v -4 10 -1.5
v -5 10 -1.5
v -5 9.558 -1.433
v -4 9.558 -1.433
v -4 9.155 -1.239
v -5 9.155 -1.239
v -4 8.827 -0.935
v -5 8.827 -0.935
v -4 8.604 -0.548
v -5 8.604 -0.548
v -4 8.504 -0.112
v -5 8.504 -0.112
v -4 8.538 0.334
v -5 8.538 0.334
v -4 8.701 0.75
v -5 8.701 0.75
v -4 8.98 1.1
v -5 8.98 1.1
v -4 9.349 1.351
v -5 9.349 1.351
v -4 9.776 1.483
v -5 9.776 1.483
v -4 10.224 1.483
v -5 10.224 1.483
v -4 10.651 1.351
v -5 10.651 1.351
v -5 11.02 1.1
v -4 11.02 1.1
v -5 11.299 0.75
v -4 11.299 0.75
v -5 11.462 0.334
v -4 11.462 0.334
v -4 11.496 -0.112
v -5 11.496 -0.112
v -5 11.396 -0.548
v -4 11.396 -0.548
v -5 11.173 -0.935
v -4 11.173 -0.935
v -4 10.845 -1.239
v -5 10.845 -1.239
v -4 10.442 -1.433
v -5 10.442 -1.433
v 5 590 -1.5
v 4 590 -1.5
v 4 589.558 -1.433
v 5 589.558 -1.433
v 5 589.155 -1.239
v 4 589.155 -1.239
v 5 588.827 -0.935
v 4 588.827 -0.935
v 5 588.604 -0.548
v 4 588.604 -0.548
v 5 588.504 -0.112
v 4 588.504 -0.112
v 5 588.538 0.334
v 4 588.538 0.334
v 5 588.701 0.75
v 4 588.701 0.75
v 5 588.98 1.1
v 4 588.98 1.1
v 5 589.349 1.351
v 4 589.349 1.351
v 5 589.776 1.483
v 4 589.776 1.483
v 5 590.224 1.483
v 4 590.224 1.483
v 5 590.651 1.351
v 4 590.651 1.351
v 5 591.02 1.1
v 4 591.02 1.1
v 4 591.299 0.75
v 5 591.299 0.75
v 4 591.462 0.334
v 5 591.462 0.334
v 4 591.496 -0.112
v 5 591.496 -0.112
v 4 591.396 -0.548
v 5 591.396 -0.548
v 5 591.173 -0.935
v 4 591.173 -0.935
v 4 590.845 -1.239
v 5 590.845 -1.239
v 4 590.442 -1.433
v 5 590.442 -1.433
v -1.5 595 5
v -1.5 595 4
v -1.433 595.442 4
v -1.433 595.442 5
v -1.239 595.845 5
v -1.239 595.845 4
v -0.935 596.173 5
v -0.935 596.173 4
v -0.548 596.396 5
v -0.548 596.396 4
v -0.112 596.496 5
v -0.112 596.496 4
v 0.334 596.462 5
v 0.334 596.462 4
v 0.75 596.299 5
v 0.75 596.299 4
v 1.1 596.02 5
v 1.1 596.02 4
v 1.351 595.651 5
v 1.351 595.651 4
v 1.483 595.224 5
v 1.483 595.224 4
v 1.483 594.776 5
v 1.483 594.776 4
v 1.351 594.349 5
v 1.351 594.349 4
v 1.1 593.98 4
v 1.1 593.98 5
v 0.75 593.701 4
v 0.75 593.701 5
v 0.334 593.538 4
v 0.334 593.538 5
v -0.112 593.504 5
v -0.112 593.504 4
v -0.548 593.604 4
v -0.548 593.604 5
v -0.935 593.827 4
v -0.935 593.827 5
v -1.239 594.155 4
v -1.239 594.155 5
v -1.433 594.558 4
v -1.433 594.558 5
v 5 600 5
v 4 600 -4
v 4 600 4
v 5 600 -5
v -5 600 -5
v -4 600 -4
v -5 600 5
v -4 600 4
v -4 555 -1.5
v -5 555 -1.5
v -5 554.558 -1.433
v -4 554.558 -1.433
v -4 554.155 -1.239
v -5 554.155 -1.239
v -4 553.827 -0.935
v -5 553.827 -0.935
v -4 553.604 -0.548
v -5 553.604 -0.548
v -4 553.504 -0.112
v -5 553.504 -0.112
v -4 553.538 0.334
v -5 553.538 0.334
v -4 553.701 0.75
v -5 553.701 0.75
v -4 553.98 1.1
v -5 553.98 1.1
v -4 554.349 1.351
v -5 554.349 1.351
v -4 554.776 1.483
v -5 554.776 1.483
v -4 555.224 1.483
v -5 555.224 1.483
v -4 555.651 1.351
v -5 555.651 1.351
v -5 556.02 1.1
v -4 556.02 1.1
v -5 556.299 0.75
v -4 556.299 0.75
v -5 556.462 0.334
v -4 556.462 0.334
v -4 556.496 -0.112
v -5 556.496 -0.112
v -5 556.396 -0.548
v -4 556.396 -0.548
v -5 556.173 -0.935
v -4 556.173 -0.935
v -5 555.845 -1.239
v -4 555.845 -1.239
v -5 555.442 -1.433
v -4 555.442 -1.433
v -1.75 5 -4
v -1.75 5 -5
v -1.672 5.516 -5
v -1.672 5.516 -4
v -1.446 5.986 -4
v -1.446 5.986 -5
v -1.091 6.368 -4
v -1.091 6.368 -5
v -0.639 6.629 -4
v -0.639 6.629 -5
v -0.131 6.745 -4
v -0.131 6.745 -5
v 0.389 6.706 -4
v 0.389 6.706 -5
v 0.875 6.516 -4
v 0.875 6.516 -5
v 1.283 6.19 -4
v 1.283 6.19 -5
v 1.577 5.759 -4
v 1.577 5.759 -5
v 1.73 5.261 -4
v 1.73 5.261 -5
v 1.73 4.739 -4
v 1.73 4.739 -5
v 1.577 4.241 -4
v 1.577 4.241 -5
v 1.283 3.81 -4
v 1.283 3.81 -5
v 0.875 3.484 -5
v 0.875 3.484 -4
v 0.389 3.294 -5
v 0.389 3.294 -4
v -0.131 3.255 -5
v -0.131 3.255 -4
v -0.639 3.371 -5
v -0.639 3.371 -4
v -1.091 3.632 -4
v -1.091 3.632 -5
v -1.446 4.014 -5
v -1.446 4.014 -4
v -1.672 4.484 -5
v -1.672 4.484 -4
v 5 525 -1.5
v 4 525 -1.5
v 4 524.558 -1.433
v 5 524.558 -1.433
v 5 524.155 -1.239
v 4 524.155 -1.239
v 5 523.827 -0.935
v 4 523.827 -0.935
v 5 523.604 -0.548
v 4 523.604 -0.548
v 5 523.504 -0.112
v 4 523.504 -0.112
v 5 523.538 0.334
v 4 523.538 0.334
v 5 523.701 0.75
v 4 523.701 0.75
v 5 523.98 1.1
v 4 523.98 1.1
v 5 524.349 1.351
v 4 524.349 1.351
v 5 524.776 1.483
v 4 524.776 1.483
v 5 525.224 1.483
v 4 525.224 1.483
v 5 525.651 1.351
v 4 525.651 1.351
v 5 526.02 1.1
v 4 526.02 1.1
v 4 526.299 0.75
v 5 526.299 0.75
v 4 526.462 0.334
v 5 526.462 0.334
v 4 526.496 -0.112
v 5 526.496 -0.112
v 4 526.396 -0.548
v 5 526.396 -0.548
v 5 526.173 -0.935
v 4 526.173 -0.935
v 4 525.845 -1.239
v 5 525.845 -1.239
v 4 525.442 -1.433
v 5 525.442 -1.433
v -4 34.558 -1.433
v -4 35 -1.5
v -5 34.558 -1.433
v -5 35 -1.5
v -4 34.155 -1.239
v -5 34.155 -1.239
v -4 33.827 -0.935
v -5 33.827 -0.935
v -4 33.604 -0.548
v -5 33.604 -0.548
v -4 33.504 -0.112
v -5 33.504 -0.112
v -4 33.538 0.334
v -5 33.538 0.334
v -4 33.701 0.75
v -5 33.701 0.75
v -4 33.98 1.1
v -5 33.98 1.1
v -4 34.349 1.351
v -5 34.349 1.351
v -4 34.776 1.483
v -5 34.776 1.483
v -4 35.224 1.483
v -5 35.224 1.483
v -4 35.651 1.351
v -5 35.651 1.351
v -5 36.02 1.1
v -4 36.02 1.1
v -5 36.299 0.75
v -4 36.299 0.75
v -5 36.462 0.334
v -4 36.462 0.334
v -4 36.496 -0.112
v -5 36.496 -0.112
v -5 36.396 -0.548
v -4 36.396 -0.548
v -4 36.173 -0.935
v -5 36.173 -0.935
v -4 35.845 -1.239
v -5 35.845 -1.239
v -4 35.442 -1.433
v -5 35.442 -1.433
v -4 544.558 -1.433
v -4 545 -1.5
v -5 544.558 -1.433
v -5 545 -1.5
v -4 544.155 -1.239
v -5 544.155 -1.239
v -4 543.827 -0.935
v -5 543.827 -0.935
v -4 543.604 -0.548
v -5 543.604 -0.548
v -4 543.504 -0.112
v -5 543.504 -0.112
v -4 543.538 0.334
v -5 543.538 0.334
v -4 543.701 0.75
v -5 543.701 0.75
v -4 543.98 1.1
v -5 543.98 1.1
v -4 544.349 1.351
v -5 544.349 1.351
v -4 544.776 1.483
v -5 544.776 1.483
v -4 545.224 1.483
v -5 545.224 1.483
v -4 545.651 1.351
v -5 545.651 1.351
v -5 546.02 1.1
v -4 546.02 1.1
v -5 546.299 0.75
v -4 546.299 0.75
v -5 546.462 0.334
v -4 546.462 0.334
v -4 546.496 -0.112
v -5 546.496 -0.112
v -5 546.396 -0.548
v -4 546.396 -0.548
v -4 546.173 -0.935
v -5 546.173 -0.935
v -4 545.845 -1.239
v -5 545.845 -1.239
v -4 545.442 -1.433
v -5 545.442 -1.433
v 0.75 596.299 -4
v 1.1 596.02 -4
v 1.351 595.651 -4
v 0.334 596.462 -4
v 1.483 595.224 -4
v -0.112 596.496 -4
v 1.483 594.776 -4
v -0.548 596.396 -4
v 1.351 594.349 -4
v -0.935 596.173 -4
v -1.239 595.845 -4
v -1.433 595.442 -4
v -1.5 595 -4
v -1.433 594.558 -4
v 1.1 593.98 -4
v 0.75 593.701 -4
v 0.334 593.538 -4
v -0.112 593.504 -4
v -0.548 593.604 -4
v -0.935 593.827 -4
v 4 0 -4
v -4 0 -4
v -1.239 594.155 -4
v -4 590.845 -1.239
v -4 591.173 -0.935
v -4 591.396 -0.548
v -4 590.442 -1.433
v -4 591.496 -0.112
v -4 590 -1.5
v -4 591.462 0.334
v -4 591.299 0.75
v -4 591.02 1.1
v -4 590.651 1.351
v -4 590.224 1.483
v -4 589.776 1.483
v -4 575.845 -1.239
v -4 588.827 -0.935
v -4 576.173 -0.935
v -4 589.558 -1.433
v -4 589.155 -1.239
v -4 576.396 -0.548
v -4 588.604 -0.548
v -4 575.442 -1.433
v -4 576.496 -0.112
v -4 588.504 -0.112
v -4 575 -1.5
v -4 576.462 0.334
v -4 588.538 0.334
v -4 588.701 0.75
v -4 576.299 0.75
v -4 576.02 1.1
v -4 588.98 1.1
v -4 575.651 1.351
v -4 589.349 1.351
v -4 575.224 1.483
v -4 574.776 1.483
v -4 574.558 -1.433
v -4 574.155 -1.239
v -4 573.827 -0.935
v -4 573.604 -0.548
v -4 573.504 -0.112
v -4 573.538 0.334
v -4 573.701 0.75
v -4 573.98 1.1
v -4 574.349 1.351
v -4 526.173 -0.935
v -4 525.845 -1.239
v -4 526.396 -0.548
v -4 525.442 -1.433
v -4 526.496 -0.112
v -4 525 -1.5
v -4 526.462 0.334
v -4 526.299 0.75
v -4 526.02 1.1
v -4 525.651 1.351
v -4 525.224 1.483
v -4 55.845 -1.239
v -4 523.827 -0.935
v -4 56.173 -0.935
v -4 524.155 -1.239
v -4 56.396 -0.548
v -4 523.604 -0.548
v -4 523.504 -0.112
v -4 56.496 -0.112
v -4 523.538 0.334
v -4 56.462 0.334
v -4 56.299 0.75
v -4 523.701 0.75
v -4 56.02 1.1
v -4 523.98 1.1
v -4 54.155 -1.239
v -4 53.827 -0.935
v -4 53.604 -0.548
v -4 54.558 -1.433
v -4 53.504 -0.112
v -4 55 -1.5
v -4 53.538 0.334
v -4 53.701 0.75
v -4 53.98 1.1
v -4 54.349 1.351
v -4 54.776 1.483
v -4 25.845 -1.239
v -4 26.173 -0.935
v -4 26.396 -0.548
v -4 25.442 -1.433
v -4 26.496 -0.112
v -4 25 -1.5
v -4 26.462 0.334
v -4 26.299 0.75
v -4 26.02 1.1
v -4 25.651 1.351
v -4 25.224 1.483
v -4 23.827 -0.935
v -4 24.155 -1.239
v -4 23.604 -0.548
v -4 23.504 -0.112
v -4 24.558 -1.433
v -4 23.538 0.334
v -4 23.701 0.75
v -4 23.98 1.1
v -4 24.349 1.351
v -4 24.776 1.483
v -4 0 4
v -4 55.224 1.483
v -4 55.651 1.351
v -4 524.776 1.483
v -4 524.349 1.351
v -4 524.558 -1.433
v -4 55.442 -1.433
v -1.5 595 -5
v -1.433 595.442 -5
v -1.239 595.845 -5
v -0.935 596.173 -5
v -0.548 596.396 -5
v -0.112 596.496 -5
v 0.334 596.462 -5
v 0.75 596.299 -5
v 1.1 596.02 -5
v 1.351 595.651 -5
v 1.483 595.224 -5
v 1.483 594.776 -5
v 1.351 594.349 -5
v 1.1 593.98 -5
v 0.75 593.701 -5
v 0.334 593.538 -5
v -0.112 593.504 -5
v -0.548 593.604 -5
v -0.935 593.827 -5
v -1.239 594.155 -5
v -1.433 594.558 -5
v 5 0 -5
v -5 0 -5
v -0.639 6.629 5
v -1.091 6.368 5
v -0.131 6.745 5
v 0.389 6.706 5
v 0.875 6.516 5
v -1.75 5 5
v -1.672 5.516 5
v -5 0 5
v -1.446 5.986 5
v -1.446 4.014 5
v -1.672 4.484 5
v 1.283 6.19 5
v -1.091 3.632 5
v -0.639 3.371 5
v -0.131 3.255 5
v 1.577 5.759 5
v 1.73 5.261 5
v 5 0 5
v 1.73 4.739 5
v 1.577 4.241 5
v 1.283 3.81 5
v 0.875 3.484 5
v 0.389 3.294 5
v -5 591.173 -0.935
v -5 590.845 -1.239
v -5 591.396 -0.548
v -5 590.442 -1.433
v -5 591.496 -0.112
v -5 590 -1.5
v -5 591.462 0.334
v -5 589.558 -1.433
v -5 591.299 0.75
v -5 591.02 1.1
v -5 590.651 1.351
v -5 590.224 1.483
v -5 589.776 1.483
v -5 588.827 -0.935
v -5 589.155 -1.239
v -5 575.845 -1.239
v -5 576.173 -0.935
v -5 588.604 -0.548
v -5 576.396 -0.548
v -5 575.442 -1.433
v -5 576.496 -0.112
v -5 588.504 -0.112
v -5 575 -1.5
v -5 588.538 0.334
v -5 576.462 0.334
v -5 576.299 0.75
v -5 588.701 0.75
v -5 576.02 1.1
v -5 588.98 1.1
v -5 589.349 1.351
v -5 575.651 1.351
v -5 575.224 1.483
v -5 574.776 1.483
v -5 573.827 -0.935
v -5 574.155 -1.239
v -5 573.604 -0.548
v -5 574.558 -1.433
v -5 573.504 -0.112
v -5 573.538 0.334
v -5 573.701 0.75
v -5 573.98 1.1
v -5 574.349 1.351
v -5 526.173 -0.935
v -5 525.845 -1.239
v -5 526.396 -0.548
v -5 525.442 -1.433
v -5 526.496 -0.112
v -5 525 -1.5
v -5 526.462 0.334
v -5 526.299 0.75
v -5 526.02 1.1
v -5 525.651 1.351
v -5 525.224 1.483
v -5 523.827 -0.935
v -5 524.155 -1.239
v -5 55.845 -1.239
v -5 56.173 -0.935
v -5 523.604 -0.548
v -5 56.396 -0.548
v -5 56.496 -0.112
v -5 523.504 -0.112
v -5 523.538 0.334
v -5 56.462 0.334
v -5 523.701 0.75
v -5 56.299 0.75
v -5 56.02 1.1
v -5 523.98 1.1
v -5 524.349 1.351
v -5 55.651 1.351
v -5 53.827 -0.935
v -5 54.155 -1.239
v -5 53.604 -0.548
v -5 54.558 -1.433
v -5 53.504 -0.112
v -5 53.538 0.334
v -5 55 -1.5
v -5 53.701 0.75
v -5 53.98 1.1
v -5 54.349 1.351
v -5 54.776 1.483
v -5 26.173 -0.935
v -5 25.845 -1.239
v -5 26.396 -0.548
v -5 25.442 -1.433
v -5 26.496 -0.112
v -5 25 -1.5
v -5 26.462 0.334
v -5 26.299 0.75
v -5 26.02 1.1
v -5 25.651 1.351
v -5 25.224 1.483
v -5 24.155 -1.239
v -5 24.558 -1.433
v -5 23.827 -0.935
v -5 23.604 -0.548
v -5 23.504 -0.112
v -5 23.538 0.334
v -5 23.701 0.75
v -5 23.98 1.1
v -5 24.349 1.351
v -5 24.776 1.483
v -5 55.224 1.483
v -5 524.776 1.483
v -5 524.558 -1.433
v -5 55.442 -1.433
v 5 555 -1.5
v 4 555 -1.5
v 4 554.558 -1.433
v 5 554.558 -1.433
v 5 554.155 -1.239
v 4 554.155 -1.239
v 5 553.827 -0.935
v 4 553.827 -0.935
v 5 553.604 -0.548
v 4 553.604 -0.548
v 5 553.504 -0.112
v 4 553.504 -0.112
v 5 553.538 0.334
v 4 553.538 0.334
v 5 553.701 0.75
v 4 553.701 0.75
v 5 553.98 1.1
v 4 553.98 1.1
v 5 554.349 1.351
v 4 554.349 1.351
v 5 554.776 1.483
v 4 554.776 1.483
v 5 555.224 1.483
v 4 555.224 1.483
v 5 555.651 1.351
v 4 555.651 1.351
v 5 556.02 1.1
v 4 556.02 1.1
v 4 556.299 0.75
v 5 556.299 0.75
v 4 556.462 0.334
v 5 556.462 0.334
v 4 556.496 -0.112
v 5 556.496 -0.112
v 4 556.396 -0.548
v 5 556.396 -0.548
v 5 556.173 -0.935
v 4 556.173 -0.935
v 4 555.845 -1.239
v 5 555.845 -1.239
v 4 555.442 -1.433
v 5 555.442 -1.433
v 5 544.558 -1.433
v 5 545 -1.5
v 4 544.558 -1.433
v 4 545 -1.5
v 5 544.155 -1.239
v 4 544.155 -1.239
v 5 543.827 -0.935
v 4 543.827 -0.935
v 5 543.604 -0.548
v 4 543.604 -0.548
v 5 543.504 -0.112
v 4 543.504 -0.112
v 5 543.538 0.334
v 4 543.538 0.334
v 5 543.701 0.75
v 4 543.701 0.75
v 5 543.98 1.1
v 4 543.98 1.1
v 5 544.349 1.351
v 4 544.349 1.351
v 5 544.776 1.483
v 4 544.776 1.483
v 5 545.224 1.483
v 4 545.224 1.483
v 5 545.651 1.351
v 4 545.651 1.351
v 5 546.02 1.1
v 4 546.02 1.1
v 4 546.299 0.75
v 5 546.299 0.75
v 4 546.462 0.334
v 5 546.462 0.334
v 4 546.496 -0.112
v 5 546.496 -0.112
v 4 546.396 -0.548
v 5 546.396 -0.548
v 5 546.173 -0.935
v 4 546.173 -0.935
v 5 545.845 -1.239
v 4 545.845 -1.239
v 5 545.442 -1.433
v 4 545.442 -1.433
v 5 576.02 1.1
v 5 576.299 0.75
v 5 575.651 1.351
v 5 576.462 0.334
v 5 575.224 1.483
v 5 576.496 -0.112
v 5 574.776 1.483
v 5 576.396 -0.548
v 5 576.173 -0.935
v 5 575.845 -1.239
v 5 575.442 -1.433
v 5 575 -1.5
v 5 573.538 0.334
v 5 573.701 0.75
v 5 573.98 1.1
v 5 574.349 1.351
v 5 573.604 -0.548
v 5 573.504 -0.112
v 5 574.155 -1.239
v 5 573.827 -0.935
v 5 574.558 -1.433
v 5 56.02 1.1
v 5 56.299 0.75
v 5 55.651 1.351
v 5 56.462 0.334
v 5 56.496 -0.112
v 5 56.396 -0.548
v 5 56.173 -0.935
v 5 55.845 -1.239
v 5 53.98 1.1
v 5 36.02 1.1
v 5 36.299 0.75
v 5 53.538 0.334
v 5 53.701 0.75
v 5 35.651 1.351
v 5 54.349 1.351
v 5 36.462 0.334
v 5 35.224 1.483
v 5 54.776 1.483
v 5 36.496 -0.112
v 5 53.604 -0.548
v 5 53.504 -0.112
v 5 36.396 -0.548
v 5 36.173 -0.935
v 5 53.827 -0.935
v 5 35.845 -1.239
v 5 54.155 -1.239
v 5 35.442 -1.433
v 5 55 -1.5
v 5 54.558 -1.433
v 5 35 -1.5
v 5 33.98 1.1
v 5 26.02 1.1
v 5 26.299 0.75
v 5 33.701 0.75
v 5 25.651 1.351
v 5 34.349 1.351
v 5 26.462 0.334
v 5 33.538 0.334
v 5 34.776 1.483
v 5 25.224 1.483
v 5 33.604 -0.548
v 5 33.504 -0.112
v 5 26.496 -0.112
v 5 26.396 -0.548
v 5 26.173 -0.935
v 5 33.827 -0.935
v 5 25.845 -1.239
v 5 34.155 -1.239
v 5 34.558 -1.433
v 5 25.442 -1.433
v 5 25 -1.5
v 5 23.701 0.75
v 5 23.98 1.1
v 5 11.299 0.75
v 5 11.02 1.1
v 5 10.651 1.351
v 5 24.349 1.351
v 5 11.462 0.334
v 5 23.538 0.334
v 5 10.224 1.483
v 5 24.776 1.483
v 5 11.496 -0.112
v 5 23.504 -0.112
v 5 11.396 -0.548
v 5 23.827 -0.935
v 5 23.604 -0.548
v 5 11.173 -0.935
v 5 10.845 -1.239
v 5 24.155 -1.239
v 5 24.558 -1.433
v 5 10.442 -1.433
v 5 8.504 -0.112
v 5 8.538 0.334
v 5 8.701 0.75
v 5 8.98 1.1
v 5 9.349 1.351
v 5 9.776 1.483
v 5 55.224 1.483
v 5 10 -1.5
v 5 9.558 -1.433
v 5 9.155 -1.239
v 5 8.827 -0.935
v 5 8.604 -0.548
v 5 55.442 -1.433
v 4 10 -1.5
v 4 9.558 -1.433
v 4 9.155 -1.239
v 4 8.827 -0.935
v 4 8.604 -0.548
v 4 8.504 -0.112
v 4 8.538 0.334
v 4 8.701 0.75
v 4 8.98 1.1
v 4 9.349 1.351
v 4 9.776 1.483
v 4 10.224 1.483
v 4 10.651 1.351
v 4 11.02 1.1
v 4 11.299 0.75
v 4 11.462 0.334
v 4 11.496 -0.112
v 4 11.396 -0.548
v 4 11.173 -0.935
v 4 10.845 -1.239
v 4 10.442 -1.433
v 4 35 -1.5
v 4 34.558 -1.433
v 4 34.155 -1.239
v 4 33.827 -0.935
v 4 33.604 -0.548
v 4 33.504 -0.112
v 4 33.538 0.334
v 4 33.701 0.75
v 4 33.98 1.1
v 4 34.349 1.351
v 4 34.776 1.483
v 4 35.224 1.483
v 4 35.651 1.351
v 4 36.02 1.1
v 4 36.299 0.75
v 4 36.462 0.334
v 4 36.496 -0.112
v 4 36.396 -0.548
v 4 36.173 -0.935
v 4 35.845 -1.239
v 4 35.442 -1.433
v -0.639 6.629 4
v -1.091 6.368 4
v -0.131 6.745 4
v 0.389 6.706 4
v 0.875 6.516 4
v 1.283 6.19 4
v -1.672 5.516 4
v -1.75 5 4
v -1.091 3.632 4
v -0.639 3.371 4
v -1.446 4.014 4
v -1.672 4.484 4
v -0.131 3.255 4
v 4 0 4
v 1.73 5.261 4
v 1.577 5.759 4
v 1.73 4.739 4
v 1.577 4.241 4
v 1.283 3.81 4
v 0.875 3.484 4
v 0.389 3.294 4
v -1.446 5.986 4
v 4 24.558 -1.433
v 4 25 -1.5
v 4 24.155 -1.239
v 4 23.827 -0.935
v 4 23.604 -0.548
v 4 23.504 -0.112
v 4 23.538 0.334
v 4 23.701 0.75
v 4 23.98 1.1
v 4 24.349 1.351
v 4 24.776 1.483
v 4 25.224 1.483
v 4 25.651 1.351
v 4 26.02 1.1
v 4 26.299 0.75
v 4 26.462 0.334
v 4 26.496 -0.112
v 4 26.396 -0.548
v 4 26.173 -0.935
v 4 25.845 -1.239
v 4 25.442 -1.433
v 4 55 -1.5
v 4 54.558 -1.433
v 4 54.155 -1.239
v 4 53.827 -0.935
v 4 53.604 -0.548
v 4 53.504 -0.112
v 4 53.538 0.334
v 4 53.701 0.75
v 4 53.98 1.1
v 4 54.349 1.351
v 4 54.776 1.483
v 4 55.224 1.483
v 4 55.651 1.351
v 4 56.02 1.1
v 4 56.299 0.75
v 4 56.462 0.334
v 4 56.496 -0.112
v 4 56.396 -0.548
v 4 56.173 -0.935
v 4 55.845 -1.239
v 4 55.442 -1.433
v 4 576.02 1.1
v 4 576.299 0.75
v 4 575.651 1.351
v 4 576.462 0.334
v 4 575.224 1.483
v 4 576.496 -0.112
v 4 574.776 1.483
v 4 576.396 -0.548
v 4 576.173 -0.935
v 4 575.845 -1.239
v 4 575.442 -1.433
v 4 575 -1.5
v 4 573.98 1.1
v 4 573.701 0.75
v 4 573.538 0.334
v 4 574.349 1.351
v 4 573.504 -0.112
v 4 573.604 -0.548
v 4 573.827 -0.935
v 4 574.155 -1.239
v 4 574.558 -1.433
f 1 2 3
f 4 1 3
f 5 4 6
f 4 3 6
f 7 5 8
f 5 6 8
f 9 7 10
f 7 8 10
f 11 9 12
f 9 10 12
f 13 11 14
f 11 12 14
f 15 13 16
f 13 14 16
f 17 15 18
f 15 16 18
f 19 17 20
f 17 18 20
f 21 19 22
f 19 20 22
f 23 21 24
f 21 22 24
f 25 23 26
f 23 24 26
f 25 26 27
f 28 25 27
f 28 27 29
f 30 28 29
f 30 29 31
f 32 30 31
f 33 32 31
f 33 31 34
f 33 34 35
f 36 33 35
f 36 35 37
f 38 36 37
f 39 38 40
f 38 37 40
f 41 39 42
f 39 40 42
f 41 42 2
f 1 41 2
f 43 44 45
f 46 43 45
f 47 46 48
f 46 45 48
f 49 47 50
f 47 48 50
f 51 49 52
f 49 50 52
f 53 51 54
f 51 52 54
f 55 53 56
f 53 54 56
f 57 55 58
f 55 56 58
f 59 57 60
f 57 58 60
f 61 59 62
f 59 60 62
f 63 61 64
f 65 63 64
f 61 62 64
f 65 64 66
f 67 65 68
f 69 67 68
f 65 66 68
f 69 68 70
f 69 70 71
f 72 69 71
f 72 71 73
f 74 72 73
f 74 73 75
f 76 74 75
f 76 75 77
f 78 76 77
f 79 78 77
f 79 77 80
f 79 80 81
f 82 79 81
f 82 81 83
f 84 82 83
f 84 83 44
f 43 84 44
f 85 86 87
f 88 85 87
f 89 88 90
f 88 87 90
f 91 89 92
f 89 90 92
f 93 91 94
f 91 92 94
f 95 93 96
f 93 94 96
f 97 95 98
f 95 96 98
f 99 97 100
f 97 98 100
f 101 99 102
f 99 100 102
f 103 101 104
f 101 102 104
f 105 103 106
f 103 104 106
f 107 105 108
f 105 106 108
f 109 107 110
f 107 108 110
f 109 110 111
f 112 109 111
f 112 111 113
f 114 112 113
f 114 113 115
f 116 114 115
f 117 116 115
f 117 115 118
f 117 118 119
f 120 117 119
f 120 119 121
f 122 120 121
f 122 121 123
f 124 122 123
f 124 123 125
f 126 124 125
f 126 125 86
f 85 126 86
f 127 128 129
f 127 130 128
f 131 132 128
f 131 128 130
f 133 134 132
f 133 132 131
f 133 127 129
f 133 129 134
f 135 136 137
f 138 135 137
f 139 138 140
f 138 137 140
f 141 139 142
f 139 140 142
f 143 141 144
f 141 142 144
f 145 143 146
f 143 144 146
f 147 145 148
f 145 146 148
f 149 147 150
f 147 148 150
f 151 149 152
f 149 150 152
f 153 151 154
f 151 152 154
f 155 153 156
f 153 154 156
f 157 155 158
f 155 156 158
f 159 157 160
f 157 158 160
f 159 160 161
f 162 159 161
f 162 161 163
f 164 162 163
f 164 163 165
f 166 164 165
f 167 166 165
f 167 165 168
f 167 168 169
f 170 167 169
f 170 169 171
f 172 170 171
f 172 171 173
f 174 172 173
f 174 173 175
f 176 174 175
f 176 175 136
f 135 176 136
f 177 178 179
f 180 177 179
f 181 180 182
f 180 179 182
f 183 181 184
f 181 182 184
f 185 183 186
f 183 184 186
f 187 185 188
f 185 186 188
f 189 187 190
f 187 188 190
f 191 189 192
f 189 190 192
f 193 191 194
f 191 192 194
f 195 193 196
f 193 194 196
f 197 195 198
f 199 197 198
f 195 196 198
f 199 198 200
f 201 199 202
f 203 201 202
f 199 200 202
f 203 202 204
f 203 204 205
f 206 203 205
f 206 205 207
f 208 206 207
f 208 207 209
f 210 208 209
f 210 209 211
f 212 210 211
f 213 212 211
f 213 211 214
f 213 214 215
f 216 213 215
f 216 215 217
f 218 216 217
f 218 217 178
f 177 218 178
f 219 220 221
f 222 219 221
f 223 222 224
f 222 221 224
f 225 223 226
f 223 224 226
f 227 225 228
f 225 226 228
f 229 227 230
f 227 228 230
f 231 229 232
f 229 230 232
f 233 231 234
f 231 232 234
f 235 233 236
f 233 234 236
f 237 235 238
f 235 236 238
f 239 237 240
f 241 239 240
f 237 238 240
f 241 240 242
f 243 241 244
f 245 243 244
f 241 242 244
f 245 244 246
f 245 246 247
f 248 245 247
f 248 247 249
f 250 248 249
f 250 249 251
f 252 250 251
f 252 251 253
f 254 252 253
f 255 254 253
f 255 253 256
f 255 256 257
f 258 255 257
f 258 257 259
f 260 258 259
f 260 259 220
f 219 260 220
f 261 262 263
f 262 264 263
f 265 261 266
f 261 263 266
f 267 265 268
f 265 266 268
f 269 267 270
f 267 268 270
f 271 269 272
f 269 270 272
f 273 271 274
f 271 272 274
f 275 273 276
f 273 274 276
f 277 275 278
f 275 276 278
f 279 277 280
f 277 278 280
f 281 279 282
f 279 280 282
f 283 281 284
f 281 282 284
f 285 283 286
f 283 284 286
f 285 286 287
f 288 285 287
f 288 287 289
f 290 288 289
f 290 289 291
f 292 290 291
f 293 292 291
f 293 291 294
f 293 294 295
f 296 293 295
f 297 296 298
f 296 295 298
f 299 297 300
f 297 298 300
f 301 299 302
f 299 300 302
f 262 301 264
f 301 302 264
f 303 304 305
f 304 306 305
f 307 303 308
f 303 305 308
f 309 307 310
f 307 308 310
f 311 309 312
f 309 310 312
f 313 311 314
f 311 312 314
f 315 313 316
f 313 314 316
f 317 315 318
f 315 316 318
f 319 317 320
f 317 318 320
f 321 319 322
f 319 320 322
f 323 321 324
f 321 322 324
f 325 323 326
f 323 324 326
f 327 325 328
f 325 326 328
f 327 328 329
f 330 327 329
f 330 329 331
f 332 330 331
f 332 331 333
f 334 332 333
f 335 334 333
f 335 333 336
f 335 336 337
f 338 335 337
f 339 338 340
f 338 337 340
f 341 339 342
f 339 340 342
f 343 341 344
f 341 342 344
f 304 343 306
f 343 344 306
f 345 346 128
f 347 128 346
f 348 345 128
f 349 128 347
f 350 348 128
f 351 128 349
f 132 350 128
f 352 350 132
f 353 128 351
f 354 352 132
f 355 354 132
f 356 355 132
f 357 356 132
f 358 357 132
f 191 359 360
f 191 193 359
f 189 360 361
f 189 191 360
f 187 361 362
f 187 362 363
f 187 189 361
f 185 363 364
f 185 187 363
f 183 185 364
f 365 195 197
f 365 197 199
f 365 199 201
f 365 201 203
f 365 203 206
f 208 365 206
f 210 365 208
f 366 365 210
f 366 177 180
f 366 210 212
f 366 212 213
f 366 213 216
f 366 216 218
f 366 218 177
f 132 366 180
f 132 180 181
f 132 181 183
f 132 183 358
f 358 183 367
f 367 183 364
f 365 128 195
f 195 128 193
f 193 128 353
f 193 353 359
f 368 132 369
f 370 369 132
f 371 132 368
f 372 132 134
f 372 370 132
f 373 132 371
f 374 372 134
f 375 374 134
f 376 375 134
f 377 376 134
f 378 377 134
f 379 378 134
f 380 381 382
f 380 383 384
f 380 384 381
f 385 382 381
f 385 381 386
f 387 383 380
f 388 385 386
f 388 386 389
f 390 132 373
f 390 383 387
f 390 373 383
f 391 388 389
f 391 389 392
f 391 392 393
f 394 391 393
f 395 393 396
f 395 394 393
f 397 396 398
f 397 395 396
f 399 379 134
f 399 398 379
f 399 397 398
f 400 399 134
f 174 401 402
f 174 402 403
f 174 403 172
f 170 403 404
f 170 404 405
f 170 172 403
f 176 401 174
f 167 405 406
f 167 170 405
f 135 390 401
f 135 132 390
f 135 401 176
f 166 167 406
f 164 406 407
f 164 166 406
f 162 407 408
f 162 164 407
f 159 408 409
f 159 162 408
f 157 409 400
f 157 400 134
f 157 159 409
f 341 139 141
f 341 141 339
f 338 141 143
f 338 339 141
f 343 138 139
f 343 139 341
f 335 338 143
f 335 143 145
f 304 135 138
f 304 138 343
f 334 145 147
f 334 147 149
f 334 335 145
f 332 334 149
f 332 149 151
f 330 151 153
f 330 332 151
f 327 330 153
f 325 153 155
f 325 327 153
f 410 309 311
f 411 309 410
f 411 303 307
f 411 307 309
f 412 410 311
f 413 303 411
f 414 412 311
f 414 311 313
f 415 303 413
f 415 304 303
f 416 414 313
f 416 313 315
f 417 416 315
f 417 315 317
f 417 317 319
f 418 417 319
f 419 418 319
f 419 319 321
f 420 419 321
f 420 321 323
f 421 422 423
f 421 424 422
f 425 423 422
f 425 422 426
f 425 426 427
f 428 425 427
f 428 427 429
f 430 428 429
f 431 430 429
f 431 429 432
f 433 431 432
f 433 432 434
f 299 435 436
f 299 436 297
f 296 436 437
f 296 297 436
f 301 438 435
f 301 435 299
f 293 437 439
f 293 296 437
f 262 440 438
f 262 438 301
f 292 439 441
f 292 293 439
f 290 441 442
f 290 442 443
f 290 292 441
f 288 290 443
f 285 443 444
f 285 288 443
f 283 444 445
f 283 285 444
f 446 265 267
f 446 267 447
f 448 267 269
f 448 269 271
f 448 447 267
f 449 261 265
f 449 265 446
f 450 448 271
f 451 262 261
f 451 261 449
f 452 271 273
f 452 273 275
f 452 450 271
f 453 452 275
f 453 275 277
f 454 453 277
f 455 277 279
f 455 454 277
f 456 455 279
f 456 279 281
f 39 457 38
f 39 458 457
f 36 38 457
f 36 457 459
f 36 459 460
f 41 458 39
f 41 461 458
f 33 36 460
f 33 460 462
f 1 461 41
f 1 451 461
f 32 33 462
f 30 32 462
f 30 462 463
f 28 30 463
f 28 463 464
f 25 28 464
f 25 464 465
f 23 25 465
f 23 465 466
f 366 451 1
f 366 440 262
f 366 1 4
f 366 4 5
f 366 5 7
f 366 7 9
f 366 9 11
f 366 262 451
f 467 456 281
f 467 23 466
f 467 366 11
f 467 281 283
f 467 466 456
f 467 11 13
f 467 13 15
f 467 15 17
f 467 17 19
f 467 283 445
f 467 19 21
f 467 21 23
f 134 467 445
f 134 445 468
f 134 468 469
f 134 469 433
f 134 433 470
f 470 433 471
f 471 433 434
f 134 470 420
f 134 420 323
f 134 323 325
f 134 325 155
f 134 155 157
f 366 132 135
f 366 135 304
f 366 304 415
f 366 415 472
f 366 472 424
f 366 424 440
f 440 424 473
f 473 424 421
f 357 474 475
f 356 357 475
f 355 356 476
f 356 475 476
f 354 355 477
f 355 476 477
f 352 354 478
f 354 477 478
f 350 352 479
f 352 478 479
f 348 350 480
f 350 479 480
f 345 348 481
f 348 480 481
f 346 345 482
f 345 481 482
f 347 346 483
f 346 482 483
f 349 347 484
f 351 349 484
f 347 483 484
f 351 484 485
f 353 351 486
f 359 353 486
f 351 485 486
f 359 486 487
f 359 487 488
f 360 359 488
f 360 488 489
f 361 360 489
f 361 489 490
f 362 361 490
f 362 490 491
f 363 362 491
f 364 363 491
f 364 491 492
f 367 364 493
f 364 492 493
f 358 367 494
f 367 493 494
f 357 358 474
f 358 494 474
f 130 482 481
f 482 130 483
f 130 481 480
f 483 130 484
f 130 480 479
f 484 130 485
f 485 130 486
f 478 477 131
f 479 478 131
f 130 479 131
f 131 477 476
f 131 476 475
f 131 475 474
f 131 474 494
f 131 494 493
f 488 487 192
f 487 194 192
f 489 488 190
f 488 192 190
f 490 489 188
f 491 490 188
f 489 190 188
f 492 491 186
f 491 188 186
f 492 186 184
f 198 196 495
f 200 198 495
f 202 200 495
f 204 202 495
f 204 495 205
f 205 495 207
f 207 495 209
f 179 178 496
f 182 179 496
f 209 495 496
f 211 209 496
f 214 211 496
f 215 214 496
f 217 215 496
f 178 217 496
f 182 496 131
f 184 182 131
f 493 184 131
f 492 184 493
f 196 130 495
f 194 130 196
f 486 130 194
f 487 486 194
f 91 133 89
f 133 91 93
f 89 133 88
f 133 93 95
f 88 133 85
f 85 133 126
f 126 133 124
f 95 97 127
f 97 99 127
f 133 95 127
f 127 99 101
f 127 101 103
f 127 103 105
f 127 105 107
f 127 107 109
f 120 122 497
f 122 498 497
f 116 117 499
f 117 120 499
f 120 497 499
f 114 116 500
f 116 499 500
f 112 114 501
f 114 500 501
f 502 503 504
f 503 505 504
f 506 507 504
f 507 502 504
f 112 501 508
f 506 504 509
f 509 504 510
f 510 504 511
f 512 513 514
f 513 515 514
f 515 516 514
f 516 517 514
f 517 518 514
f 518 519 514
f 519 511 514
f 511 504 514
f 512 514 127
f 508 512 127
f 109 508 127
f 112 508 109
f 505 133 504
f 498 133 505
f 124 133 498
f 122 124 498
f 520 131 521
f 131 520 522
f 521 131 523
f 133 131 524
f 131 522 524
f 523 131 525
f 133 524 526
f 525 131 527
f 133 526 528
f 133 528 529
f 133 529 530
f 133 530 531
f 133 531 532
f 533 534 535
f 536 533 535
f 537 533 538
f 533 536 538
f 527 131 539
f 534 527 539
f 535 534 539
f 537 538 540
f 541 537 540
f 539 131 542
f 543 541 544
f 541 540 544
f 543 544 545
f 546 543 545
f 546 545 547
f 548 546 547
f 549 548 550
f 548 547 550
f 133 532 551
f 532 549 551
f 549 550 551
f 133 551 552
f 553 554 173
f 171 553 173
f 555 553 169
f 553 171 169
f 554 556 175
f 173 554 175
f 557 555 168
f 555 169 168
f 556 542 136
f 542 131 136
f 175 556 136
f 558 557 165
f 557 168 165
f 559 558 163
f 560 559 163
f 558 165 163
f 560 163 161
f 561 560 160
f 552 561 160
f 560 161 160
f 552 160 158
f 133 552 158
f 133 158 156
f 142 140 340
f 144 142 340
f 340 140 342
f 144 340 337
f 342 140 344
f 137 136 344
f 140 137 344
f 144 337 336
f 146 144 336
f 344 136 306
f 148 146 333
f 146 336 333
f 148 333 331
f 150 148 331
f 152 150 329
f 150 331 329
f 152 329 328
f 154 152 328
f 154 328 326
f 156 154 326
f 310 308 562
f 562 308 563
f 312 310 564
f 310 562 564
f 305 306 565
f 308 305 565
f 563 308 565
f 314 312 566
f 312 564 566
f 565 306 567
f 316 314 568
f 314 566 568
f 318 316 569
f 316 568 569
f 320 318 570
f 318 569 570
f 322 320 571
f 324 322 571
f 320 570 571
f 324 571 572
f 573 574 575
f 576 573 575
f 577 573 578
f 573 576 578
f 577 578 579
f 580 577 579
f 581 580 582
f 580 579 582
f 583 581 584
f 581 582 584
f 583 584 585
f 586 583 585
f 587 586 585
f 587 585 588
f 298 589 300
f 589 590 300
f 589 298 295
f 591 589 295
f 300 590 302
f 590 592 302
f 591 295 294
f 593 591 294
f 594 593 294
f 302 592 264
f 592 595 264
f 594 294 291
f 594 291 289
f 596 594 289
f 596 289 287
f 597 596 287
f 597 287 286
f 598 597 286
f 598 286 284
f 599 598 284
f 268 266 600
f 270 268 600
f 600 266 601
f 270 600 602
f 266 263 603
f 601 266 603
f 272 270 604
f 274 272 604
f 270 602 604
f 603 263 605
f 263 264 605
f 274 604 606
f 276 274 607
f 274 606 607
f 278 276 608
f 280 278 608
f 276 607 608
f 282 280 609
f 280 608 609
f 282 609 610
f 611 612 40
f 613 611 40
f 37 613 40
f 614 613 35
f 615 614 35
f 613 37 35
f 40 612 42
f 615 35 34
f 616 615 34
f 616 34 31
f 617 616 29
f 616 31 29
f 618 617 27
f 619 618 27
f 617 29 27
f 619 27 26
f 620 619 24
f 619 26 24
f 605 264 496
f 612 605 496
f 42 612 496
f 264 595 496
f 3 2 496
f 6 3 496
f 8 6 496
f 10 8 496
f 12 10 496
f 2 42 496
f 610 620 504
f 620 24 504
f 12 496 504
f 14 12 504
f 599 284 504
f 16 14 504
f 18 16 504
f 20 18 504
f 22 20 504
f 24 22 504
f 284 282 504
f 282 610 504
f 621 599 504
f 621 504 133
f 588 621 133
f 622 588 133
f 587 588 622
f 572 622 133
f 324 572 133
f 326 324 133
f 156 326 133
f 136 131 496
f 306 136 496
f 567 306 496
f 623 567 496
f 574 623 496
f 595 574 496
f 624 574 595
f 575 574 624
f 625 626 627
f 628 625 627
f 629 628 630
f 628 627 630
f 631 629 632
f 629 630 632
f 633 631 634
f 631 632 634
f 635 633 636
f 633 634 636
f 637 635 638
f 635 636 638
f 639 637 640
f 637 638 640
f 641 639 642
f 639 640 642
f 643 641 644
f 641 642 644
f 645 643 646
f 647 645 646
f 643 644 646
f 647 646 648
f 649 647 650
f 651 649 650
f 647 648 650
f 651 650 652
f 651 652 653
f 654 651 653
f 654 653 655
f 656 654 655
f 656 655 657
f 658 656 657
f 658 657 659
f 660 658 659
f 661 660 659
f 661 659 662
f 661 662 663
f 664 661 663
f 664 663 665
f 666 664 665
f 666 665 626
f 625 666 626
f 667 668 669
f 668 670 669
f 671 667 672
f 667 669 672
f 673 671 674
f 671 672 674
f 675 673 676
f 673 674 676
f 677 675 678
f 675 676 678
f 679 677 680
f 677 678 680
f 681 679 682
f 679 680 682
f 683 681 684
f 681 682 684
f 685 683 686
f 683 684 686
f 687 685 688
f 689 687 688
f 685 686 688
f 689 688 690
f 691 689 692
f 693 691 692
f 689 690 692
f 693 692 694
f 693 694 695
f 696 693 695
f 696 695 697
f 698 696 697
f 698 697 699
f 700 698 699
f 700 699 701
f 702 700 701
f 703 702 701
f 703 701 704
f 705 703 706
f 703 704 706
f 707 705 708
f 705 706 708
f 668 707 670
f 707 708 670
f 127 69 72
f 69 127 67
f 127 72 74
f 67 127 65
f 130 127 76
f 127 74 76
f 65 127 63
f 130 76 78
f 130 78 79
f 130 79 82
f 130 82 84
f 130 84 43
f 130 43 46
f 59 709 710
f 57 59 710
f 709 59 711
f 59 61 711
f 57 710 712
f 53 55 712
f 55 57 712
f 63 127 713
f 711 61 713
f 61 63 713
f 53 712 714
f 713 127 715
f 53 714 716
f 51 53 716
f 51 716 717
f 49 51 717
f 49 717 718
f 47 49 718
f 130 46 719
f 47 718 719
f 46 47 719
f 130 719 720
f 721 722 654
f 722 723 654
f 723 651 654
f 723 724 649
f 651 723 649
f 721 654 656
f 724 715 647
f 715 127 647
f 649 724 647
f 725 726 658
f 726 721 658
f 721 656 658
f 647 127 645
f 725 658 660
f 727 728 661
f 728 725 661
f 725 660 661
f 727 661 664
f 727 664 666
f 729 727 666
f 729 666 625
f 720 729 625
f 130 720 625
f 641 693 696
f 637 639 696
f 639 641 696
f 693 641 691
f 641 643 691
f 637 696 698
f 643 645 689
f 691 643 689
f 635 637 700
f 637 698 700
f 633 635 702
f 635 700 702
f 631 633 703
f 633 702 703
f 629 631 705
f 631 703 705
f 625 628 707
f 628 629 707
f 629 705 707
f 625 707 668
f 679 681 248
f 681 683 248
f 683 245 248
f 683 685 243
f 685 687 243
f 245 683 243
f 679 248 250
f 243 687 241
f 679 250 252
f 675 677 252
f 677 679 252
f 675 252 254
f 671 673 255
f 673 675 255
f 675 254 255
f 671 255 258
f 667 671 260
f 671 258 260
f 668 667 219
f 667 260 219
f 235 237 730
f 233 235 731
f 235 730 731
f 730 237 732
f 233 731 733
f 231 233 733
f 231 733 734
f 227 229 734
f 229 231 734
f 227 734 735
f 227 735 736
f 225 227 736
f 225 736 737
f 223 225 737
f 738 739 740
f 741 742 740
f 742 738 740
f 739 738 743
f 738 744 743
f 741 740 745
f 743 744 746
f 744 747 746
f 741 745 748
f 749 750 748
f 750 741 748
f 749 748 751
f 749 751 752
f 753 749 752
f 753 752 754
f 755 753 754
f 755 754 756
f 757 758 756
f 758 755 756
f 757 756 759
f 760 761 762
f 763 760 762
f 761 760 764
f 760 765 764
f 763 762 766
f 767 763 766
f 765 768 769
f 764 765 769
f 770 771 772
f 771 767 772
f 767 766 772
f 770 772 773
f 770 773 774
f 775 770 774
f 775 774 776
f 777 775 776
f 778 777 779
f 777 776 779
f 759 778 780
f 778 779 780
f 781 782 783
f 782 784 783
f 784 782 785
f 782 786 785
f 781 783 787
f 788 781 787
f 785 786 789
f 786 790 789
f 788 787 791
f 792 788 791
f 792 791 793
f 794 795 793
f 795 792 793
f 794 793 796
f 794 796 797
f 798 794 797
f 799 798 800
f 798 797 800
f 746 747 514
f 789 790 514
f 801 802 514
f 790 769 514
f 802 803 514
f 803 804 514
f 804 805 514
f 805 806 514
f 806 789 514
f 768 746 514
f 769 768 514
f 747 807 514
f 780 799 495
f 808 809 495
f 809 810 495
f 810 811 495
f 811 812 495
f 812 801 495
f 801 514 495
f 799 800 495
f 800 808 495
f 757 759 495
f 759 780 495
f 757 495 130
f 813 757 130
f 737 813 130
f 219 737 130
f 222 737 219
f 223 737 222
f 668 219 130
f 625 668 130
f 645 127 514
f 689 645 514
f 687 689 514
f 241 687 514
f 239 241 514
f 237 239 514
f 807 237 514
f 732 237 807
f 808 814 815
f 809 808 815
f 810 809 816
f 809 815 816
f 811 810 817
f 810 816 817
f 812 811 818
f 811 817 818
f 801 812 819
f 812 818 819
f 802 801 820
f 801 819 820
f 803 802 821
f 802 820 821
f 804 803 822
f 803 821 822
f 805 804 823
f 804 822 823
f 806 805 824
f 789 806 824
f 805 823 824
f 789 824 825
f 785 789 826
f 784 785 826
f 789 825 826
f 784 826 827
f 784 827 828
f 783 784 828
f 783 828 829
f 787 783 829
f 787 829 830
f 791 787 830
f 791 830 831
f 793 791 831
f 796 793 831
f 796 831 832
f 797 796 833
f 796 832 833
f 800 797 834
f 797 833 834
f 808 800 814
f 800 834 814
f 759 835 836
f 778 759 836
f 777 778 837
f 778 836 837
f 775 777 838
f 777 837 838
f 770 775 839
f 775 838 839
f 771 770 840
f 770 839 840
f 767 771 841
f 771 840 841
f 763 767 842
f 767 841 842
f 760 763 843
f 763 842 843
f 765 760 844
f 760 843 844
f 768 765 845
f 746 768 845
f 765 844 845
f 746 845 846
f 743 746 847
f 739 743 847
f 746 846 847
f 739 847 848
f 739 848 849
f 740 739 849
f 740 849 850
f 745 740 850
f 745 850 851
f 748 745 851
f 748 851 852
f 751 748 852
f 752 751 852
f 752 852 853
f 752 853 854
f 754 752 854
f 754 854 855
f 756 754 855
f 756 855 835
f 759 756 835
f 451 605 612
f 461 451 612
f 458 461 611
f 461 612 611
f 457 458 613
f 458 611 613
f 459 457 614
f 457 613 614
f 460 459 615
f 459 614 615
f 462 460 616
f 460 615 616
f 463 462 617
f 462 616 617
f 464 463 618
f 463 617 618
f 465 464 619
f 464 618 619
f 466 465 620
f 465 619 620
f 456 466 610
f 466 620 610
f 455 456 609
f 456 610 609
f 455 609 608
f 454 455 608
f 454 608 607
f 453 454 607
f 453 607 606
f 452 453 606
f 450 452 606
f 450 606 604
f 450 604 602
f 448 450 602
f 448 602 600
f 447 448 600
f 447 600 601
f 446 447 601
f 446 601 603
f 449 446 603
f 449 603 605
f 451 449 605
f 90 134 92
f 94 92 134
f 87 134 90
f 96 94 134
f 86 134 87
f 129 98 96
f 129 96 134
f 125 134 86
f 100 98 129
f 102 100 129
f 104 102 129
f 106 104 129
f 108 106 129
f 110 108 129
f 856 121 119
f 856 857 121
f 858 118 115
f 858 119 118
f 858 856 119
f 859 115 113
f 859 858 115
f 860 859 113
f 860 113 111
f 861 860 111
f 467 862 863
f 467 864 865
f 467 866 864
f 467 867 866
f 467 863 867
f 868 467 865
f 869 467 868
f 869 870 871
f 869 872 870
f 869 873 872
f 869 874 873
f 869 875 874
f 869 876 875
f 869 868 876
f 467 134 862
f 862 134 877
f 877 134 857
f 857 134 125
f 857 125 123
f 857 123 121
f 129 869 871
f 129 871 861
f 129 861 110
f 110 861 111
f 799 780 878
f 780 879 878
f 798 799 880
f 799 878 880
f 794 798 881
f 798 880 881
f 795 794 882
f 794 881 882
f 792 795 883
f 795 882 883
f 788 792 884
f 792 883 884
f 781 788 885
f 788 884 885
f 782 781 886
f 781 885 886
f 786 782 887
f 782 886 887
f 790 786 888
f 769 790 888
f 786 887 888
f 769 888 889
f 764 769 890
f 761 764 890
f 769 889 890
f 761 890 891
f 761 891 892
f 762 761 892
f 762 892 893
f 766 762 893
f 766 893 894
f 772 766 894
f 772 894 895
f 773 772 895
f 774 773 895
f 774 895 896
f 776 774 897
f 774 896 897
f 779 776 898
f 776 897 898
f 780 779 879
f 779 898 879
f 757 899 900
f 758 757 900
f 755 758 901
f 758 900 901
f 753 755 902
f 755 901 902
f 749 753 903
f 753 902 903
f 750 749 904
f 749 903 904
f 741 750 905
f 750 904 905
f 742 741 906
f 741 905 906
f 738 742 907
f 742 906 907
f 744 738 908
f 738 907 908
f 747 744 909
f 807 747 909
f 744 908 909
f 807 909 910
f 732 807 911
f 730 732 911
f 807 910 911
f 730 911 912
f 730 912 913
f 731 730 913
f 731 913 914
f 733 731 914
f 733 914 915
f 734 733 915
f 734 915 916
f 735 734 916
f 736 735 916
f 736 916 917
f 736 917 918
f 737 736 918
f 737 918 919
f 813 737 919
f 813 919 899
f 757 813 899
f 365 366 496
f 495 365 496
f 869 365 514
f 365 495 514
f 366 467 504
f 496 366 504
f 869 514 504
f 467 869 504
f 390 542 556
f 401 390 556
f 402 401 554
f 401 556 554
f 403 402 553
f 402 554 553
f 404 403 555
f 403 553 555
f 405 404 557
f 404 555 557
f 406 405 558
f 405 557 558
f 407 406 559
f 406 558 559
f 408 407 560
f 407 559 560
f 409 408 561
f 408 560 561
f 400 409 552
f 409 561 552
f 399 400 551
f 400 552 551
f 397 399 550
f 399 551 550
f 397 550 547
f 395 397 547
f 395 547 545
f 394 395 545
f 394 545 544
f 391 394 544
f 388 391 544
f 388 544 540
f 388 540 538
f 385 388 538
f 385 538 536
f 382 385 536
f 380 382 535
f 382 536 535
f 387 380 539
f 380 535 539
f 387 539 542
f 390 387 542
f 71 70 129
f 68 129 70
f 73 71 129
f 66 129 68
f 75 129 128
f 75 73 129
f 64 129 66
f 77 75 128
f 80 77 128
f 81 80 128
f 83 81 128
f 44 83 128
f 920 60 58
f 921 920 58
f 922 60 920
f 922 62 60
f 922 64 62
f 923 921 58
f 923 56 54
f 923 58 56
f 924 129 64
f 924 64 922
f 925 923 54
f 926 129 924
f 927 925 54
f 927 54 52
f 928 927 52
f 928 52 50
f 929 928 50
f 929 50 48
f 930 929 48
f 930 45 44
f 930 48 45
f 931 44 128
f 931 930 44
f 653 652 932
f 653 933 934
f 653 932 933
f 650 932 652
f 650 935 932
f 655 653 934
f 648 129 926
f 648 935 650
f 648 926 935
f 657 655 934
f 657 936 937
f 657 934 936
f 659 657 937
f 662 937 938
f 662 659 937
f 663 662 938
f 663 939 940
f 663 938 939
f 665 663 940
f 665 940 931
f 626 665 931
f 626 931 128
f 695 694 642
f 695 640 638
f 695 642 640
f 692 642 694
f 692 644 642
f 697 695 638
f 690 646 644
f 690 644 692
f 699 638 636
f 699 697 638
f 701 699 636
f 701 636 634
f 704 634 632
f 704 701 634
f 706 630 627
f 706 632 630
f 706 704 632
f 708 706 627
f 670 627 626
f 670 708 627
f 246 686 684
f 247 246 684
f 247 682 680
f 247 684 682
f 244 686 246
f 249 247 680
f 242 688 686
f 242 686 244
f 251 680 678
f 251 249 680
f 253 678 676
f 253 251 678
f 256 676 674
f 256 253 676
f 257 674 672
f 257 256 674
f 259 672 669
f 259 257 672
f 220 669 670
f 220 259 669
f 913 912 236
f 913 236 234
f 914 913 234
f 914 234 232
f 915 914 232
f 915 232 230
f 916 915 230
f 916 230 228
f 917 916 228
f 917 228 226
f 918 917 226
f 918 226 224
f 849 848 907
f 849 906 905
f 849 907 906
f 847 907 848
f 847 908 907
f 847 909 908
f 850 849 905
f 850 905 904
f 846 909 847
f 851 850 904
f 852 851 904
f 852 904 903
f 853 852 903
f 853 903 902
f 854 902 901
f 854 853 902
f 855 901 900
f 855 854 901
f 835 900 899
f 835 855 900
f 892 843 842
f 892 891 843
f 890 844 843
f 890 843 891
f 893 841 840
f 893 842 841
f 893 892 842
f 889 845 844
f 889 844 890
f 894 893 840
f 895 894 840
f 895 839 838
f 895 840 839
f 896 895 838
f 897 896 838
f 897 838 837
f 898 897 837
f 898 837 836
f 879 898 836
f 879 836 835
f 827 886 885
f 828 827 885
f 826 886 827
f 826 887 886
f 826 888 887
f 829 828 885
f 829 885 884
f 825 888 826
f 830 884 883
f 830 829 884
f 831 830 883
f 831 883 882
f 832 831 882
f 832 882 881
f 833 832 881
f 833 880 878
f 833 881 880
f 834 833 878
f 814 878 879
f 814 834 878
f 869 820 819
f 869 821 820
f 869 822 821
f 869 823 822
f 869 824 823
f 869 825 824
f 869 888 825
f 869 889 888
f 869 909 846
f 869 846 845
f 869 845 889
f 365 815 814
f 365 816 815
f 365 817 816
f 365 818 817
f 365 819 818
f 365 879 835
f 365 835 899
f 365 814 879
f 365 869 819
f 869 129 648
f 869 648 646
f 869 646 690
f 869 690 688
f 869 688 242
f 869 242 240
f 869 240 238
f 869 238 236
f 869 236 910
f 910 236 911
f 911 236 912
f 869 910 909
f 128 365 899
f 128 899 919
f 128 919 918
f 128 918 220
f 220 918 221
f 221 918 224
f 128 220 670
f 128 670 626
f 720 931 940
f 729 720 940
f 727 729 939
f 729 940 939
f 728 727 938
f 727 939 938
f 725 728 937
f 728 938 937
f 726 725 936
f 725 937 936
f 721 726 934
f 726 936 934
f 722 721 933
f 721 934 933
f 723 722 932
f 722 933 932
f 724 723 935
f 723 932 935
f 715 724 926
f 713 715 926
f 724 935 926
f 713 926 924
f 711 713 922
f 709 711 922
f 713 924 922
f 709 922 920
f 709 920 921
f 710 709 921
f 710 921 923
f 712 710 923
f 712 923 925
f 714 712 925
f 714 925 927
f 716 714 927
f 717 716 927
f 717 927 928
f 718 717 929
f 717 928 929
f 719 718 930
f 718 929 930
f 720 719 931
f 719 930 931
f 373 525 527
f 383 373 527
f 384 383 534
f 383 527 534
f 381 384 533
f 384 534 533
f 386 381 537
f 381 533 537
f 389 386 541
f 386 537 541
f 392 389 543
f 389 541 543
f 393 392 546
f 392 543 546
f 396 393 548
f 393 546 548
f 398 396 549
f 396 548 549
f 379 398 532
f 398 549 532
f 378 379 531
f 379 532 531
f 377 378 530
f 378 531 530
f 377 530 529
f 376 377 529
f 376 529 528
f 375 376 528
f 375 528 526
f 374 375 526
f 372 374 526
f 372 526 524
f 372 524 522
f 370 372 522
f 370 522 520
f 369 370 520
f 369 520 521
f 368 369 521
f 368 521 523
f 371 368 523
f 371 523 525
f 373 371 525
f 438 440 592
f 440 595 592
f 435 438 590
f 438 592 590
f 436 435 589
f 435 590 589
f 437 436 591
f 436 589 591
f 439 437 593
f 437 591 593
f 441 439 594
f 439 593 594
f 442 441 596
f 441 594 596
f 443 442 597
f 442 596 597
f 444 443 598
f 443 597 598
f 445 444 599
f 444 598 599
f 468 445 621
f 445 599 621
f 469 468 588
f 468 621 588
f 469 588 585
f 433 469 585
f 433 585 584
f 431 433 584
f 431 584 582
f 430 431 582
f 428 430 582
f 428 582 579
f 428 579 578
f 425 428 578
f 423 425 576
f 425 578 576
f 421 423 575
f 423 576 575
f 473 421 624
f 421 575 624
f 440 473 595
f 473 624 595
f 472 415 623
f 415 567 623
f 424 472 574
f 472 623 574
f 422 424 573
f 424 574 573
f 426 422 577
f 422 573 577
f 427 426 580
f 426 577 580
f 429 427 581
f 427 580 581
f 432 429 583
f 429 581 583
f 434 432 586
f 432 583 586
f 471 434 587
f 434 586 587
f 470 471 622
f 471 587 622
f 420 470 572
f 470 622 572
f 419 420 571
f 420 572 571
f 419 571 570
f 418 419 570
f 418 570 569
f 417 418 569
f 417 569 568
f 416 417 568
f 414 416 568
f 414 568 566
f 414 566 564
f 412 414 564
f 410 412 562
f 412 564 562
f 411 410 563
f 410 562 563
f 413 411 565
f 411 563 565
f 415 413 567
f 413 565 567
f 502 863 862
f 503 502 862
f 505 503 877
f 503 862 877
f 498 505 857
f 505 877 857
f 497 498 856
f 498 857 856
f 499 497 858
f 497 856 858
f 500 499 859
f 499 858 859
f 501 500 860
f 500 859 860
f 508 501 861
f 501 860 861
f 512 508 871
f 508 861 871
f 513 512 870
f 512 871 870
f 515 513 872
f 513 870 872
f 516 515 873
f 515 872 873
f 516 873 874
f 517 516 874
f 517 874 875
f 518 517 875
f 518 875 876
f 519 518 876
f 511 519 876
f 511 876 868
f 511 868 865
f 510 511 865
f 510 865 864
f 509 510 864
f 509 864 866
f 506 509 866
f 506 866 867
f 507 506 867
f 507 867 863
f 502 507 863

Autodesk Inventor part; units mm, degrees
ref_plane "YZ Plane" through (0, 0, 0) normal (1, 0, 0) x (0, 1, 0)
ref_plane "XZ Plane" through (0, 0, 0) normal (0, 1, 0) x (-1, 0, 0)
sketch "Sketch1" plane through (0, 0, 0) normal (0, 1, 0) x (-1, 0, 0)
  line L0 (-5, -5) -> (5, -5)
  line L1 (5, -5) -> (5, 5)
  line L2 (5, 5) -> (-5, 5)
  line L3 (-5, 5) -> (-5, -5)
  line L4 (-5, -5) -> (5, 5) construction
  line L5 (5, -5) -> (-5, 5) construction
  line L6 (-4, -4) -> (4, -4)
  line L7 (4, -4) -> (4, 4)
  line L8 (4, 4) -> (-4, 4)
  line L9 (-4, 4) -> (-4, -4)
  line L10 (-4, -4) -> (4, 4) construction
  line L11 (4, -4) -> (-4, 4) construction
  point P0 (0, 0)
  dimension "d0" = 10
  dimension "d1" = 10
  dimension "d2" = 8
  dimension "d3" = 8
extrude "Extrusion1" add sketch "Sketch1" along normal blind 600
sketch "Sketch2" plane through (5, 0, -5) normal (1, 0, 0) x (0, 0, -1)
  line L0 (-10, 600) -> (0, 600) projected
  line L1 (-10, 0) -> (0, 0) projected
  point P0 (-5, 0)
  point P1 (-5, 545)
  point P2 (-5, 525)
  point P3 (-5, 590)
  point P4 (-5, 555)
  point P5 (-5, 575)
  point P6 (-5, 10)
  point P7 (-5, 25)
  point P8 (-5, 35)
  point P9 (-5, 55)
  point P10 (-5, 107.8006)
  dimension "d6" = 55
  dimension "d7" = 20
  dimension "d21" = 10
  dimension "d23" = 35
  dimension "d24" = 15
  dimension "d25" = 10
  dimension "d26" = 15
  dimension "d27" = 10
  dimension "d28" = 20
hole "Hole1" at (5, 545, 0) at (5, 525, 0) at (5, 590, 0) at (5, 555, 0) at (5, 575, 0) at (5, 10, 0) at (5, 25, 0) at (5, 35, 0) at (5, 55, 0) direction (-1, 0, 0) diameter 3 depth 80.45
sketch "Sketch3" plane through (-5, 0, -5) normal (0, 0, -1) x (-1, 0, 0)
  line L0 (-10, 600) -> (0, 600) projected
  circle A0 centre (-5, 595) radius 1.5
  line L1 (-10, 0) -> (0, 0) projected
  circle A1 centre (-5, 5) radius 1.75
  point P0 (-5, 0)
  dimension "d15" = 5
  dimension "d16" = 3
  dimension "d19" = 5
  dimension "d20" = 3.5
extrude "Extrusion2" cut sketch "Sketch3" against normal blind 600
ref_plane "Work Plane1" through (0, 300, 0) normal (0, 1, 0) x (1, 0, 0)
properties part number "10x10x600" material "アルミニウム 6061"
